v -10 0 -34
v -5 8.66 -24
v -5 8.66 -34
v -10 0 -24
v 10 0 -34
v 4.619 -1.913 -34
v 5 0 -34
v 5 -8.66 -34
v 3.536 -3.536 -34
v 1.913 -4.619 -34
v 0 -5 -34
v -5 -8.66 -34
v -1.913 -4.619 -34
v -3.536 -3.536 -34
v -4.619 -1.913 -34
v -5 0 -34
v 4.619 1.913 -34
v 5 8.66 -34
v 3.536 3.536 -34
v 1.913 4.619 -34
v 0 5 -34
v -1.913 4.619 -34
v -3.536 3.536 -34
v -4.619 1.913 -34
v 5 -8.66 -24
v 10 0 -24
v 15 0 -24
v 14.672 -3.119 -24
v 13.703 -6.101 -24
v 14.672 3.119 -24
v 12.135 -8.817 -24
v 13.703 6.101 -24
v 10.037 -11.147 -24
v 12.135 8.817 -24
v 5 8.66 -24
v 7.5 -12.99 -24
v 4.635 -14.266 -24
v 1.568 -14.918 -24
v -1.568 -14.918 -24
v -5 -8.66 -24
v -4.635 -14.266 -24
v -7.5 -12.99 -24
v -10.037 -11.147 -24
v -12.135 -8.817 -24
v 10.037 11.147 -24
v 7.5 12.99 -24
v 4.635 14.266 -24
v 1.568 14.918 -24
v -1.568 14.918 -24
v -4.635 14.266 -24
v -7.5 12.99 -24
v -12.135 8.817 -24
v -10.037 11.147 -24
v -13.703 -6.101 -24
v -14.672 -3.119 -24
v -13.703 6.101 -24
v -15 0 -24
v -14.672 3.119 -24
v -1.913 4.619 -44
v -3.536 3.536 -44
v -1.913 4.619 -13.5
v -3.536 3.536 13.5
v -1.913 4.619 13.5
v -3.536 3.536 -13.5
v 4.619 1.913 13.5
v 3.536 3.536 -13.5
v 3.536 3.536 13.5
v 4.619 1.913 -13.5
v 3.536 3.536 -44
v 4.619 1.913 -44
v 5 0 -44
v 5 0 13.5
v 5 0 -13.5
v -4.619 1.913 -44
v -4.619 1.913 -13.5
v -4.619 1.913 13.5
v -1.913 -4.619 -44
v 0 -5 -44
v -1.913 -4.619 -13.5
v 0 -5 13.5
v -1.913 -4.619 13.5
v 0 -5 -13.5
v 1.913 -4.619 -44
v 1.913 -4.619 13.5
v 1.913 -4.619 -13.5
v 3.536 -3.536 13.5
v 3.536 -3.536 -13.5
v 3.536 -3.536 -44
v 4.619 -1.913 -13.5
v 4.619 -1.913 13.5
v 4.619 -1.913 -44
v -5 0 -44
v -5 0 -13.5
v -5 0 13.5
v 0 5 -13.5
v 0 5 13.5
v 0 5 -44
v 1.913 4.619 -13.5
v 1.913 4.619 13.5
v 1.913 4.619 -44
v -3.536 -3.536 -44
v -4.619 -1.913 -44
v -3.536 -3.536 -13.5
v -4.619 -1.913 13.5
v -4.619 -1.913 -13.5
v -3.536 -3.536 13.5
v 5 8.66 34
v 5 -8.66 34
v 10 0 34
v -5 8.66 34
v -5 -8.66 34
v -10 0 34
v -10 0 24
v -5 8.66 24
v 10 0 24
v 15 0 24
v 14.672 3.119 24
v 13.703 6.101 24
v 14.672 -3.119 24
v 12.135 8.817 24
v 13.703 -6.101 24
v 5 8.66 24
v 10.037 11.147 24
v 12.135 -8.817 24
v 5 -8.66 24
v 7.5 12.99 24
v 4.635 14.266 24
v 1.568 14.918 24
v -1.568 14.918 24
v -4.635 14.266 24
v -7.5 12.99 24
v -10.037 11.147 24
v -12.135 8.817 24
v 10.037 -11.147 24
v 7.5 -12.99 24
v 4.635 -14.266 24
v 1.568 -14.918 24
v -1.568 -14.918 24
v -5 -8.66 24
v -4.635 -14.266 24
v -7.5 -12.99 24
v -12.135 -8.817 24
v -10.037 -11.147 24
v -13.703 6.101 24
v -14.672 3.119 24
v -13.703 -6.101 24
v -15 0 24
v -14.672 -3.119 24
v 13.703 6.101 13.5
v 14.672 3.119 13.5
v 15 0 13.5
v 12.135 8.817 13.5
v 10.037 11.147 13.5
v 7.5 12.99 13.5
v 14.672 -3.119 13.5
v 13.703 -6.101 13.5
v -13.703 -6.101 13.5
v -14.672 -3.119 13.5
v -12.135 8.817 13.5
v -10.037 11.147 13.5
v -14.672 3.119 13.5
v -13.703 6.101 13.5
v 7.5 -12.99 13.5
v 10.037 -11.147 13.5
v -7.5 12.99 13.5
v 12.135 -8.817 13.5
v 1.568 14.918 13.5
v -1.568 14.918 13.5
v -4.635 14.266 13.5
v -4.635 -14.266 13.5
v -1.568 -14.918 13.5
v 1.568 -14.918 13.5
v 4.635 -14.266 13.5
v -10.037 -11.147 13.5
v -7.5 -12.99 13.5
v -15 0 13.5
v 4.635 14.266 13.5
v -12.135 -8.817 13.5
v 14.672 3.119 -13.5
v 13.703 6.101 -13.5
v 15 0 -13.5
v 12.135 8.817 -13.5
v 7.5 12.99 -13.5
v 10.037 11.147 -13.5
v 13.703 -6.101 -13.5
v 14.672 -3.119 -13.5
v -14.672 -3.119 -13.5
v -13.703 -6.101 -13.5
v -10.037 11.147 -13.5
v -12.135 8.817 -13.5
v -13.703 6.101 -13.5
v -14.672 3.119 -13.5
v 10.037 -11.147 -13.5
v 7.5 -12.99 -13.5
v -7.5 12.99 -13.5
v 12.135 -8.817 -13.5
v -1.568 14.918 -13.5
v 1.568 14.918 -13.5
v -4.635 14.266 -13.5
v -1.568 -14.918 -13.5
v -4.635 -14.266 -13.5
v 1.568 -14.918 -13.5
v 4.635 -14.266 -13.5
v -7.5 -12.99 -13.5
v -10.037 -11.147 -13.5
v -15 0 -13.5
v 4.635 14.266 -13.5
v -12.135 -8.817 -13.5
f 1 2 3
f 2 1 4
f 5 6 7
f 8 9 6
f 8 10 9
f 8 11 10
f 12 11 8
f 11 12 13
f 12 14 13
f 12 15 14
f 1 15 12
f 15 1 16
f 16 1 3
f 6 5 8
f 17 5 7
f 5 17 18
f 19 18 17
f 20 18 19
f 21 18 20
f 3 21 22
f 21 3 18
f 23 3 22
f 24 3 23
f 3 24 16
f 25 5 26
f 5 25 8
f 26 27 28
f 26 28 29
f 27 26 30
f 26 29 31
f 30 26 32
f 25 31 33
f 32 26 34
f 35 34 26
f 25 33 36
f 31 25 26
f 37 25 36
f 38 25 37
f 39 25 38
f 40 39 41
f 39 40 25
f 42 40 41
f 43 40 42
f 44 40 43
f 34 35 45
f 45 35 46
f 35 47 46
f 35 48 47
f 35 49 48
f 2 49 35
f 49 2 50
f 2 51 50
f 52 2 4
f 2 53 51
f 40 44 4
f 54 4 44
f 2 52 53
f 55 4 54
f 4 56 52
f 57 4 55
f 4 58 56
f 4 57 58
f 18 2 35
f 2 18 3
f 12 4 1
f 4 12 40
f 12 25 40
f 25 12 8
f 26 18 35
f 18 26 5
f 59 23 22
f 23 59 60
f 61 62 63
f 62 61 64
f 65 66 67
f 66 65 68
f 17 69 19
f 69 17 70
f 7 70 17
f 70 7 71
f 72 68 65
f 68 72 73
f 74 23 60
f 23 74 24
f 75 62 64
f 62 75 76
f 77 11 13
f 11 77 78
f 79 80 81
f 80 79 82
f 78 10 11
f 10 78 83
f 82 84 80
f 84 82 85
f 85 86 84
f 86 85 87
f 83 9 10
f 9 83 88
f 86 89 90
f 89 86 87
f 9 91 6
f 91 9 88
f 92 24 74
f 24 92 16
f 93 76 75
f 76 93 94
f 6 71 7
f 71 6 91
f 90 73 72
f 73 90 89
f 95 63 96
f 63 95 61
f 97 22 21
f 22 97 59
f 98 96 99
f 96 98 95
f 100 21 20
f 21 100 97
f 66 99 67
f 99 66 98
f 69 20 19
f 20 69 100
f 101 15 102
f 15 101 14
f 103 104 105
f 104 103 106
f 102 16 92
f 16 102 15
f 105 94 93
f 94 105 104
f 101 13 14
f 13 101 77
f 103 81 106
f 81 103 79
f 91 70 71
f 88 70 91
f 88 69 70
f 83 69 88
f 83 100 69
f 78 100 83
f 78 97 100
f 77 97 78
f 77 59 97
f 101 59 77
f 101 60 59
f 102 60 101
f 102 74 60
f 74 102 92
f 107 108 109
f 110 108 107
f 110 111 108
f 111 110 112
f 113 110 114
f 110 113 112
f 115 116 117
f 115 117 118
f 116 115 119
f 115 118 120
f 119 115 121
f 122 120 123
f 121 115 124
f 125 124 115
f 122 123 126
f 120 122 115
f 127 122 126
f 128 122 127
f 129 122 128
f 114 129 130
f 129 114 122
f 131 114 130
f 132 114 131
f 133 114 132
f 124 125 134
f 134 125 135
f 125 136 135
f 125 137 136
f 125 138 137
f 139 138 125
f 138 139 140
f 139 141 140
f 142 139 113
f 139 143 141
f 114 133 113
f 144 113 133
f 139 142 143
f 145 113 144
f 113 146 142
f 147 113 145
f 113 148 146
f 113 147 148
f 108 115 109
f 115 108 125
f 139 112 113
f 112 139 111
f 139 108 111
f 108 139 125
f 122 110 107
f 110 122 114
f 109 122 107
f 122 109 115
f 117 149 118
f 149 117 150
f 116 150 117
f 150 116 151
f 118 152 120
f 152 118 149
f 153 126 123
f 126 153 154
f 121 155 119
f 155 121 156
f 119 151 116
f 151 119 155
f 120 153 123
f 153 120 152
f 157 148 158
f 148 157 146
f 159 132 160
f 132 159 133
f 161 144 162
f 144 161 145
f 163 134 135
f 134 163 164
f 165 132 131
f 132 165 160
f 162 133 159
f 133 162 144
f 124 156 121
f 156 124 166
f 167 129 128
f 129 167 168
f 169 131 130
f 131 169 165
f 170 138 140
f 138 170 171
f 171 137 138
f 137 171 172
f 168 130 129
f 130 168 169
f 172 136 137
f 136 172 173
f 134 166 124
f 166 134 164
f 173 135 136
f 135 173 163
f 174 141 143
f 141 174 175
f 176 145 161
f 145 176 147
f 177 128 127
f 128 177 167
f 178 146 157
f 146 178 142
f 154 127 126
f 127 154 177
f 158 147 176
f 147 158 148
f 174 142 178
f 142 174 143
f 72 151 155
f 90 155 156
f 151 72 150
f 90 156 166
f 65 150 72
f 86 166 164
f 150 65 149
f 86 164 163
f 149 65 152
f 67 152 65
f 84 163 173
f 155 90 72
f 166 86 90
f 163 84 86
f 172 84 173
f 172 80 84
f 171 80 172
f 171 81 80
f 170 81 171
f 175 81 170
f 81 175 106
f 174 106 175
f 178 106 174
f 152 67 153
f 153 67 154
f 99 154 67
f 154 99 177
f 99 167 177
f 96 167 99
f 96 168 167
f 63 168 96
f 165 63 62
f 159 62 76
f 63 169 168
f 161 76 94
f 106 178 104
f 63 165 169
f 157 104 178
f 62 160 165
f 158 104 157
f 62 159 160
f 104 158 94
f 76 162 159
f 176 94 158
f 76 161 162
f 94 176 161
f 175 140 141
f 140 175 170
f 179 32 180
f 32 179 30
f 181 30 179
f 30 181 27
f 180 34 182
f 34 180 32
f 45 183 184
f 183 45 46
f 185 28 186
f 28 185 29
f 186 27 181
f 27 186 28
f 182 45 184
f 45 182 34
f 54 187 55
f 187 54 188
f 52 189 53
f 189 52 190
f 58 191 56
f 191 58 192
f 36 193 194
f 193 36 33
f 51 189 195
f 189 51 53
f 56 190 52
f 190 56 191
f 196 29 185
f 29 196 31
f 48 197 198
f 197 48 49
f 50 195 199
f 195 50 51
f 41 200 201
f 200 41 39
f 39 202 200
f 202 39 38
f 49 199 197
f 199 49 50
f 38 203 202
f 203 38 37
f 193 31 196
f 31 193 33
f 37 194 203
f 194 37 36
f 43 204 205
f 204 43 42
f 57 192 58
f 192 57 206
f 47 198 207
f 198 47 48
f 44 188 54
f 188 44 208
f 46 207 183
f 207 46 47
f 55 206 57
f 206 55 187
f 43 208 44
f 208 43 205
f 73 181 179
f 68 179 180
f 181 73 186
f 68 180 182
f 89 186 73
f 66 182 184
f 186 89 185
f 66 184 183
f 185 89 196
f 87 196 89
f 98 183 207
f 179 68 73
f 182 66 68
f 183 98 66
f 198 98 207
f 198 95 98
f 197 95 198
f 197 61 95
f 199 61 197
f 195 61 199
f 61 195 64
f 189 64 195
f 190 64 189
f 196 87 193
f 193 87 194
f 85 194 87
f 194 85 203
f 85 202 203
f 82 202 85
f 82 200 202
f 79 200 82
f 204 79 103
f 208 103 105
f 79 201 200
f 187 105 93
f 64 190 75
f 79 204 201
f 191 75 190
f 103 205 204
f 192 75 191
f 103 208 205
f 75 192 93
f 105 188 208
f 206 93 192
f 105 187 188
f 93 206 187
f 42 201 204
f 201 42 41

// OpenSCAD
// file: ../common/metric_nut.scad
// include <../../config.scad>;
use <./beam_hexagonal.scad>;
use <./metric_bolt_functions.scad>;

module metric_nut(size, centre = true) {
    height = get_metric_bolt_head_height(size);
    diameter = get_metric_bolt_head_diameter(size);
    radius = diameter / 2;
    color("gray") difference() {
        // body
        beam_hexagonal(height, diameter, centre = centre, suppress_shopping_outputs = true);
        // hole
        cylinder(height, size / 2, size / 2, center = centre);
    }
    // Shopping
    echo(str("Nut: Nut M", size, " - x1"));
}

// $fn = 200;
metric_nut(12);
// file: ../common/beam_hexagonal.scad
// include <../../config.scad>;

module beam_hexagonal(L, d, centre = true, suppress_shopping_outputs = false) {
    radius = d / 2;
    linear_extrude(L, center = centre) polygon([[radius, 0], [radius * cos(60), radius * sin(60)], [radius * cos(120), radius * sin(120)], [radius * cos(180), radius * sin(180)], [radius * cos(240), radius * sin(240)], [radius * cos(300), radius * sin(300)]]);
    // Shopping
    if (!suppress_shopping_outputs) {
        echo(str("Hexagonal beam: Hexagonal beam Φ", d, "mm x ", L, "mm - x1"));
    }
}

// $fn = 200;
beam_hexagonal(500, 50);
// file: ../fixings/tube_clamp_square_base_plate_132_functions.scad
function get_L_shaft_with_base_plate_square_base_plate_132(beam_width) = 
    // (beam_width == 40) ?
    75
;
function get_R_plate_square_base_plate_132(beam_width) = 
    // (beam_width == 40) ?
    [143, 75, 18.5]
;
function get_thickness_square_base_plate_132(beam_width) = 
    // (beam_width == 40) ?
    8
;
function get_offset_hole_x_square_base_plate_132(beam_width) = 
    // (beam_width == 40) ?
    100 / 2
;
function get_diameter_hole_square_base_plate_132(beam_width) = 
    // (beam_width == 40) ?
    10
;
// file: ../fixings/tube_clamp_round_base_plate_132_functions.scad
function get_L_shaft_with_base_plate_round_base_plate_132(tube_diameter) = 
    (tube_diameter == 27) ? 
        85
    : (tube_diameter == 42) ?
        122
    : 25
;
function get_R_plate_round_base_plate_132(tube_diameter) = 
    (tube_diameter == 27) ? 
        [64, 114, 7]
    : (tube_diameter == 42) ?
        [80, 140, 10]
    : [10, 20, 1]
;
function get_offset_hole_y_round_base_plate_132(tube_diameter) = 
    (tube_diameter == 27) ? 
        38
    : (tube_diameter == 42) ?
        50
    : 10
;
function get_diameter_hole_round_base_plate_132(tube_diameter) = 10;
// file: ../fixings/tube_clamp_round_3_way_through_116_functions.scad
function  get_L_shaft_long_round_3_way_through_116(tube_diameter) = 
    (tube_diameter == 27) ? 
        42
    : (tube_diameter == 42) ?
        60
    : 25
;
function get_thickness_round_3_way_through_116(tube_diameter) = 7;
function get_L_shaft_short_round_3_way_through_116(tube_diameter) = tube_diameter + 2 * get_thickness_round_3_way_through_116();
// file: ../fixings/tube_clamp_round_tee_long_104_functions.scad
// include <../../config.scad>;

function get_L_shaft_long_round_tee_long_104(tube_diameter) = 
    (tube_diameter == 27) ? 
        85
    : (tube_diameter == 42) ?
        122
    : 25
;
function get_L_shaft_short_round_tee_long_104(tube_diameter) = 
    (tube_diameter == 27) ? 
        42
    : (tube_diameter == 42) ?
        61
    : 10
;
// file: ../brake/brake_assembly_functions.scad
// include <../../config.scad>; // circular reference!

function get_y_pos_lead_fixing_ballscrew_to_brake_arms(angle_brake_rod, y_pos_axle_rear, x_pos_axle_leg_rear, x_offset_fixing_brake_arm_to_lead_plate) = y_pos_axle_rear + (x_pos_axle_leg_rear - x_offset_fixing_brake_arm_to_lead_plate) / tan(angle_brake_rod); // (X_POS_AXLE_LEG_REAR - X_OFFSET_FIXING_BRAKE_ARM_TO_LEAD_PLATE)
// file: ../common/metric_bolt_functions.scad
function get_metric_bolt_head_height(size) = size;
function get_metric_bolt_head_diameter(size) = size * 2;
function get_metric_bolt_washer_diameter_safe_working_clearance(size) = 
    (size < 20) ?
        4 * size
    :
        3 * size
;
// file: ../common/washer.scad
include <../../config.scad>;

module washer(t, d_outer, d_inner, centre = true) {
    r_outer = d_outer / 2;
    r_inner = d_inner / 2;
    color("silver") difference() {
        cylinder(t, r_outer, r_outer, center = centre);
        cylinder(t, r_inner, r_inner, center = centre);
    }
    // Shopping
    echo(str("Washer: Washer Φ", d_outer, "mm x ", d_inner, "mm x ", t, "mm - x1"));
}

// $fn = 200;
washer(3, 10, 40);
// file: ../common/metric_bolt.scad
// include <../../config.scad>;
use <./beam_hexagonal.scad>;
use <./metric_bolt_functions.scad>;
use <./metric_nut.scad>;

module metric_bolt(size, length, has_nut = true, offset_nut_from_end = 0) {
    echo("Metric bolt assembly:");
    head_height = get_metric_bolt_head_height(size);
    head_diameter = get_metric_bolt_head_diameter(size);
    head_radius = head_diameter / 2;
    color("gray") union() {
        // Stem
        cylinder(length, size / 2, size / 2, center = true);
        // Head
        translate([0, 0, length / 2 - size / 2]) beam_hexagonal(head_height, head_diameter, centre = true, suppress_shopping_outputs = true);
        if (has_nut) {
            // Nut
            translate([0, 0, -(length / 2 - size / 2) + offset_nut_from_end]) metric_nut(size);
        }
    }
    // Shopping
    echo(str("Bolt: Bolt M", size, " x ", length, "mm - x1"));
}

// $fn = 200;
metric_bolt(12, 100);
translate([30, 0, 0]) metric_bolt(12, 100, false);
translate([60, 0, 0]) metric_bolt(12, 100, true, 5);
// main file
include <../../config.scad>;
use <../common/metric_bolt.scad>;
use <../common/washer.scad>;

module rear_wheel_fastener() {
    echo("Rear wheel fastener:");
    height_bolt_head = get_metric_bolt_head_height(SIZE_BOLT_REAR_WHEEL_POSITIONING);
    count_washers_each_end = 7;
    L_bolt = D_AXLE_REAR + 2 * height_bolt_head + 2 * T_WASHER_BOLT_REAR_WHEEL_POSITIONING * count_washers_each_end + L_BOLT_EXTENSION;
    union() {
        // bolt
        translate([0, 0, -L_BOLT_EXTENSION / 2]) metric_bolt(SIZE_BOLT_REAR_WHEEL_POSITIONING, L_bolt, true, L_BOLT_EXTENSION);
        for (index_side_bolt = [0 : 1 : 1]) {
            mirror([0, 0, index_side_bolt]) { 
                // washer
                for (index_washer = [0 : 1 : max(0, count_washers_each_end - 1)]) {
                    translate([0, 0, D_AXLE_REAR / 2 + T_WASHER_BOLT_REAR_WHEEL_POSITIONING * (index_washer + 1/2)]) washer(T_WASHER_BOLT_REAR_WHEEL_POSITIONING, D_WASHER_BOLT_REAR_WHEEL_POSITIONING, SIZE_BOLT_REAR_WHEEL_POSITIONING);
                }
            }
        }
    }
    // Shopping
    // bolt
    // echo(str("Bolt washer: Washer Φ", D_WASHER_BOLT_REAR_WHEEL_POSITIONING, "mm x ", T_WASHER_BOLT_REAR_WHEEL_POSITIONING, "mm - x", 2 * count_washers_each_end)); // Rear wheel fastener bolt washers
}

rear_wheel_fastener();
